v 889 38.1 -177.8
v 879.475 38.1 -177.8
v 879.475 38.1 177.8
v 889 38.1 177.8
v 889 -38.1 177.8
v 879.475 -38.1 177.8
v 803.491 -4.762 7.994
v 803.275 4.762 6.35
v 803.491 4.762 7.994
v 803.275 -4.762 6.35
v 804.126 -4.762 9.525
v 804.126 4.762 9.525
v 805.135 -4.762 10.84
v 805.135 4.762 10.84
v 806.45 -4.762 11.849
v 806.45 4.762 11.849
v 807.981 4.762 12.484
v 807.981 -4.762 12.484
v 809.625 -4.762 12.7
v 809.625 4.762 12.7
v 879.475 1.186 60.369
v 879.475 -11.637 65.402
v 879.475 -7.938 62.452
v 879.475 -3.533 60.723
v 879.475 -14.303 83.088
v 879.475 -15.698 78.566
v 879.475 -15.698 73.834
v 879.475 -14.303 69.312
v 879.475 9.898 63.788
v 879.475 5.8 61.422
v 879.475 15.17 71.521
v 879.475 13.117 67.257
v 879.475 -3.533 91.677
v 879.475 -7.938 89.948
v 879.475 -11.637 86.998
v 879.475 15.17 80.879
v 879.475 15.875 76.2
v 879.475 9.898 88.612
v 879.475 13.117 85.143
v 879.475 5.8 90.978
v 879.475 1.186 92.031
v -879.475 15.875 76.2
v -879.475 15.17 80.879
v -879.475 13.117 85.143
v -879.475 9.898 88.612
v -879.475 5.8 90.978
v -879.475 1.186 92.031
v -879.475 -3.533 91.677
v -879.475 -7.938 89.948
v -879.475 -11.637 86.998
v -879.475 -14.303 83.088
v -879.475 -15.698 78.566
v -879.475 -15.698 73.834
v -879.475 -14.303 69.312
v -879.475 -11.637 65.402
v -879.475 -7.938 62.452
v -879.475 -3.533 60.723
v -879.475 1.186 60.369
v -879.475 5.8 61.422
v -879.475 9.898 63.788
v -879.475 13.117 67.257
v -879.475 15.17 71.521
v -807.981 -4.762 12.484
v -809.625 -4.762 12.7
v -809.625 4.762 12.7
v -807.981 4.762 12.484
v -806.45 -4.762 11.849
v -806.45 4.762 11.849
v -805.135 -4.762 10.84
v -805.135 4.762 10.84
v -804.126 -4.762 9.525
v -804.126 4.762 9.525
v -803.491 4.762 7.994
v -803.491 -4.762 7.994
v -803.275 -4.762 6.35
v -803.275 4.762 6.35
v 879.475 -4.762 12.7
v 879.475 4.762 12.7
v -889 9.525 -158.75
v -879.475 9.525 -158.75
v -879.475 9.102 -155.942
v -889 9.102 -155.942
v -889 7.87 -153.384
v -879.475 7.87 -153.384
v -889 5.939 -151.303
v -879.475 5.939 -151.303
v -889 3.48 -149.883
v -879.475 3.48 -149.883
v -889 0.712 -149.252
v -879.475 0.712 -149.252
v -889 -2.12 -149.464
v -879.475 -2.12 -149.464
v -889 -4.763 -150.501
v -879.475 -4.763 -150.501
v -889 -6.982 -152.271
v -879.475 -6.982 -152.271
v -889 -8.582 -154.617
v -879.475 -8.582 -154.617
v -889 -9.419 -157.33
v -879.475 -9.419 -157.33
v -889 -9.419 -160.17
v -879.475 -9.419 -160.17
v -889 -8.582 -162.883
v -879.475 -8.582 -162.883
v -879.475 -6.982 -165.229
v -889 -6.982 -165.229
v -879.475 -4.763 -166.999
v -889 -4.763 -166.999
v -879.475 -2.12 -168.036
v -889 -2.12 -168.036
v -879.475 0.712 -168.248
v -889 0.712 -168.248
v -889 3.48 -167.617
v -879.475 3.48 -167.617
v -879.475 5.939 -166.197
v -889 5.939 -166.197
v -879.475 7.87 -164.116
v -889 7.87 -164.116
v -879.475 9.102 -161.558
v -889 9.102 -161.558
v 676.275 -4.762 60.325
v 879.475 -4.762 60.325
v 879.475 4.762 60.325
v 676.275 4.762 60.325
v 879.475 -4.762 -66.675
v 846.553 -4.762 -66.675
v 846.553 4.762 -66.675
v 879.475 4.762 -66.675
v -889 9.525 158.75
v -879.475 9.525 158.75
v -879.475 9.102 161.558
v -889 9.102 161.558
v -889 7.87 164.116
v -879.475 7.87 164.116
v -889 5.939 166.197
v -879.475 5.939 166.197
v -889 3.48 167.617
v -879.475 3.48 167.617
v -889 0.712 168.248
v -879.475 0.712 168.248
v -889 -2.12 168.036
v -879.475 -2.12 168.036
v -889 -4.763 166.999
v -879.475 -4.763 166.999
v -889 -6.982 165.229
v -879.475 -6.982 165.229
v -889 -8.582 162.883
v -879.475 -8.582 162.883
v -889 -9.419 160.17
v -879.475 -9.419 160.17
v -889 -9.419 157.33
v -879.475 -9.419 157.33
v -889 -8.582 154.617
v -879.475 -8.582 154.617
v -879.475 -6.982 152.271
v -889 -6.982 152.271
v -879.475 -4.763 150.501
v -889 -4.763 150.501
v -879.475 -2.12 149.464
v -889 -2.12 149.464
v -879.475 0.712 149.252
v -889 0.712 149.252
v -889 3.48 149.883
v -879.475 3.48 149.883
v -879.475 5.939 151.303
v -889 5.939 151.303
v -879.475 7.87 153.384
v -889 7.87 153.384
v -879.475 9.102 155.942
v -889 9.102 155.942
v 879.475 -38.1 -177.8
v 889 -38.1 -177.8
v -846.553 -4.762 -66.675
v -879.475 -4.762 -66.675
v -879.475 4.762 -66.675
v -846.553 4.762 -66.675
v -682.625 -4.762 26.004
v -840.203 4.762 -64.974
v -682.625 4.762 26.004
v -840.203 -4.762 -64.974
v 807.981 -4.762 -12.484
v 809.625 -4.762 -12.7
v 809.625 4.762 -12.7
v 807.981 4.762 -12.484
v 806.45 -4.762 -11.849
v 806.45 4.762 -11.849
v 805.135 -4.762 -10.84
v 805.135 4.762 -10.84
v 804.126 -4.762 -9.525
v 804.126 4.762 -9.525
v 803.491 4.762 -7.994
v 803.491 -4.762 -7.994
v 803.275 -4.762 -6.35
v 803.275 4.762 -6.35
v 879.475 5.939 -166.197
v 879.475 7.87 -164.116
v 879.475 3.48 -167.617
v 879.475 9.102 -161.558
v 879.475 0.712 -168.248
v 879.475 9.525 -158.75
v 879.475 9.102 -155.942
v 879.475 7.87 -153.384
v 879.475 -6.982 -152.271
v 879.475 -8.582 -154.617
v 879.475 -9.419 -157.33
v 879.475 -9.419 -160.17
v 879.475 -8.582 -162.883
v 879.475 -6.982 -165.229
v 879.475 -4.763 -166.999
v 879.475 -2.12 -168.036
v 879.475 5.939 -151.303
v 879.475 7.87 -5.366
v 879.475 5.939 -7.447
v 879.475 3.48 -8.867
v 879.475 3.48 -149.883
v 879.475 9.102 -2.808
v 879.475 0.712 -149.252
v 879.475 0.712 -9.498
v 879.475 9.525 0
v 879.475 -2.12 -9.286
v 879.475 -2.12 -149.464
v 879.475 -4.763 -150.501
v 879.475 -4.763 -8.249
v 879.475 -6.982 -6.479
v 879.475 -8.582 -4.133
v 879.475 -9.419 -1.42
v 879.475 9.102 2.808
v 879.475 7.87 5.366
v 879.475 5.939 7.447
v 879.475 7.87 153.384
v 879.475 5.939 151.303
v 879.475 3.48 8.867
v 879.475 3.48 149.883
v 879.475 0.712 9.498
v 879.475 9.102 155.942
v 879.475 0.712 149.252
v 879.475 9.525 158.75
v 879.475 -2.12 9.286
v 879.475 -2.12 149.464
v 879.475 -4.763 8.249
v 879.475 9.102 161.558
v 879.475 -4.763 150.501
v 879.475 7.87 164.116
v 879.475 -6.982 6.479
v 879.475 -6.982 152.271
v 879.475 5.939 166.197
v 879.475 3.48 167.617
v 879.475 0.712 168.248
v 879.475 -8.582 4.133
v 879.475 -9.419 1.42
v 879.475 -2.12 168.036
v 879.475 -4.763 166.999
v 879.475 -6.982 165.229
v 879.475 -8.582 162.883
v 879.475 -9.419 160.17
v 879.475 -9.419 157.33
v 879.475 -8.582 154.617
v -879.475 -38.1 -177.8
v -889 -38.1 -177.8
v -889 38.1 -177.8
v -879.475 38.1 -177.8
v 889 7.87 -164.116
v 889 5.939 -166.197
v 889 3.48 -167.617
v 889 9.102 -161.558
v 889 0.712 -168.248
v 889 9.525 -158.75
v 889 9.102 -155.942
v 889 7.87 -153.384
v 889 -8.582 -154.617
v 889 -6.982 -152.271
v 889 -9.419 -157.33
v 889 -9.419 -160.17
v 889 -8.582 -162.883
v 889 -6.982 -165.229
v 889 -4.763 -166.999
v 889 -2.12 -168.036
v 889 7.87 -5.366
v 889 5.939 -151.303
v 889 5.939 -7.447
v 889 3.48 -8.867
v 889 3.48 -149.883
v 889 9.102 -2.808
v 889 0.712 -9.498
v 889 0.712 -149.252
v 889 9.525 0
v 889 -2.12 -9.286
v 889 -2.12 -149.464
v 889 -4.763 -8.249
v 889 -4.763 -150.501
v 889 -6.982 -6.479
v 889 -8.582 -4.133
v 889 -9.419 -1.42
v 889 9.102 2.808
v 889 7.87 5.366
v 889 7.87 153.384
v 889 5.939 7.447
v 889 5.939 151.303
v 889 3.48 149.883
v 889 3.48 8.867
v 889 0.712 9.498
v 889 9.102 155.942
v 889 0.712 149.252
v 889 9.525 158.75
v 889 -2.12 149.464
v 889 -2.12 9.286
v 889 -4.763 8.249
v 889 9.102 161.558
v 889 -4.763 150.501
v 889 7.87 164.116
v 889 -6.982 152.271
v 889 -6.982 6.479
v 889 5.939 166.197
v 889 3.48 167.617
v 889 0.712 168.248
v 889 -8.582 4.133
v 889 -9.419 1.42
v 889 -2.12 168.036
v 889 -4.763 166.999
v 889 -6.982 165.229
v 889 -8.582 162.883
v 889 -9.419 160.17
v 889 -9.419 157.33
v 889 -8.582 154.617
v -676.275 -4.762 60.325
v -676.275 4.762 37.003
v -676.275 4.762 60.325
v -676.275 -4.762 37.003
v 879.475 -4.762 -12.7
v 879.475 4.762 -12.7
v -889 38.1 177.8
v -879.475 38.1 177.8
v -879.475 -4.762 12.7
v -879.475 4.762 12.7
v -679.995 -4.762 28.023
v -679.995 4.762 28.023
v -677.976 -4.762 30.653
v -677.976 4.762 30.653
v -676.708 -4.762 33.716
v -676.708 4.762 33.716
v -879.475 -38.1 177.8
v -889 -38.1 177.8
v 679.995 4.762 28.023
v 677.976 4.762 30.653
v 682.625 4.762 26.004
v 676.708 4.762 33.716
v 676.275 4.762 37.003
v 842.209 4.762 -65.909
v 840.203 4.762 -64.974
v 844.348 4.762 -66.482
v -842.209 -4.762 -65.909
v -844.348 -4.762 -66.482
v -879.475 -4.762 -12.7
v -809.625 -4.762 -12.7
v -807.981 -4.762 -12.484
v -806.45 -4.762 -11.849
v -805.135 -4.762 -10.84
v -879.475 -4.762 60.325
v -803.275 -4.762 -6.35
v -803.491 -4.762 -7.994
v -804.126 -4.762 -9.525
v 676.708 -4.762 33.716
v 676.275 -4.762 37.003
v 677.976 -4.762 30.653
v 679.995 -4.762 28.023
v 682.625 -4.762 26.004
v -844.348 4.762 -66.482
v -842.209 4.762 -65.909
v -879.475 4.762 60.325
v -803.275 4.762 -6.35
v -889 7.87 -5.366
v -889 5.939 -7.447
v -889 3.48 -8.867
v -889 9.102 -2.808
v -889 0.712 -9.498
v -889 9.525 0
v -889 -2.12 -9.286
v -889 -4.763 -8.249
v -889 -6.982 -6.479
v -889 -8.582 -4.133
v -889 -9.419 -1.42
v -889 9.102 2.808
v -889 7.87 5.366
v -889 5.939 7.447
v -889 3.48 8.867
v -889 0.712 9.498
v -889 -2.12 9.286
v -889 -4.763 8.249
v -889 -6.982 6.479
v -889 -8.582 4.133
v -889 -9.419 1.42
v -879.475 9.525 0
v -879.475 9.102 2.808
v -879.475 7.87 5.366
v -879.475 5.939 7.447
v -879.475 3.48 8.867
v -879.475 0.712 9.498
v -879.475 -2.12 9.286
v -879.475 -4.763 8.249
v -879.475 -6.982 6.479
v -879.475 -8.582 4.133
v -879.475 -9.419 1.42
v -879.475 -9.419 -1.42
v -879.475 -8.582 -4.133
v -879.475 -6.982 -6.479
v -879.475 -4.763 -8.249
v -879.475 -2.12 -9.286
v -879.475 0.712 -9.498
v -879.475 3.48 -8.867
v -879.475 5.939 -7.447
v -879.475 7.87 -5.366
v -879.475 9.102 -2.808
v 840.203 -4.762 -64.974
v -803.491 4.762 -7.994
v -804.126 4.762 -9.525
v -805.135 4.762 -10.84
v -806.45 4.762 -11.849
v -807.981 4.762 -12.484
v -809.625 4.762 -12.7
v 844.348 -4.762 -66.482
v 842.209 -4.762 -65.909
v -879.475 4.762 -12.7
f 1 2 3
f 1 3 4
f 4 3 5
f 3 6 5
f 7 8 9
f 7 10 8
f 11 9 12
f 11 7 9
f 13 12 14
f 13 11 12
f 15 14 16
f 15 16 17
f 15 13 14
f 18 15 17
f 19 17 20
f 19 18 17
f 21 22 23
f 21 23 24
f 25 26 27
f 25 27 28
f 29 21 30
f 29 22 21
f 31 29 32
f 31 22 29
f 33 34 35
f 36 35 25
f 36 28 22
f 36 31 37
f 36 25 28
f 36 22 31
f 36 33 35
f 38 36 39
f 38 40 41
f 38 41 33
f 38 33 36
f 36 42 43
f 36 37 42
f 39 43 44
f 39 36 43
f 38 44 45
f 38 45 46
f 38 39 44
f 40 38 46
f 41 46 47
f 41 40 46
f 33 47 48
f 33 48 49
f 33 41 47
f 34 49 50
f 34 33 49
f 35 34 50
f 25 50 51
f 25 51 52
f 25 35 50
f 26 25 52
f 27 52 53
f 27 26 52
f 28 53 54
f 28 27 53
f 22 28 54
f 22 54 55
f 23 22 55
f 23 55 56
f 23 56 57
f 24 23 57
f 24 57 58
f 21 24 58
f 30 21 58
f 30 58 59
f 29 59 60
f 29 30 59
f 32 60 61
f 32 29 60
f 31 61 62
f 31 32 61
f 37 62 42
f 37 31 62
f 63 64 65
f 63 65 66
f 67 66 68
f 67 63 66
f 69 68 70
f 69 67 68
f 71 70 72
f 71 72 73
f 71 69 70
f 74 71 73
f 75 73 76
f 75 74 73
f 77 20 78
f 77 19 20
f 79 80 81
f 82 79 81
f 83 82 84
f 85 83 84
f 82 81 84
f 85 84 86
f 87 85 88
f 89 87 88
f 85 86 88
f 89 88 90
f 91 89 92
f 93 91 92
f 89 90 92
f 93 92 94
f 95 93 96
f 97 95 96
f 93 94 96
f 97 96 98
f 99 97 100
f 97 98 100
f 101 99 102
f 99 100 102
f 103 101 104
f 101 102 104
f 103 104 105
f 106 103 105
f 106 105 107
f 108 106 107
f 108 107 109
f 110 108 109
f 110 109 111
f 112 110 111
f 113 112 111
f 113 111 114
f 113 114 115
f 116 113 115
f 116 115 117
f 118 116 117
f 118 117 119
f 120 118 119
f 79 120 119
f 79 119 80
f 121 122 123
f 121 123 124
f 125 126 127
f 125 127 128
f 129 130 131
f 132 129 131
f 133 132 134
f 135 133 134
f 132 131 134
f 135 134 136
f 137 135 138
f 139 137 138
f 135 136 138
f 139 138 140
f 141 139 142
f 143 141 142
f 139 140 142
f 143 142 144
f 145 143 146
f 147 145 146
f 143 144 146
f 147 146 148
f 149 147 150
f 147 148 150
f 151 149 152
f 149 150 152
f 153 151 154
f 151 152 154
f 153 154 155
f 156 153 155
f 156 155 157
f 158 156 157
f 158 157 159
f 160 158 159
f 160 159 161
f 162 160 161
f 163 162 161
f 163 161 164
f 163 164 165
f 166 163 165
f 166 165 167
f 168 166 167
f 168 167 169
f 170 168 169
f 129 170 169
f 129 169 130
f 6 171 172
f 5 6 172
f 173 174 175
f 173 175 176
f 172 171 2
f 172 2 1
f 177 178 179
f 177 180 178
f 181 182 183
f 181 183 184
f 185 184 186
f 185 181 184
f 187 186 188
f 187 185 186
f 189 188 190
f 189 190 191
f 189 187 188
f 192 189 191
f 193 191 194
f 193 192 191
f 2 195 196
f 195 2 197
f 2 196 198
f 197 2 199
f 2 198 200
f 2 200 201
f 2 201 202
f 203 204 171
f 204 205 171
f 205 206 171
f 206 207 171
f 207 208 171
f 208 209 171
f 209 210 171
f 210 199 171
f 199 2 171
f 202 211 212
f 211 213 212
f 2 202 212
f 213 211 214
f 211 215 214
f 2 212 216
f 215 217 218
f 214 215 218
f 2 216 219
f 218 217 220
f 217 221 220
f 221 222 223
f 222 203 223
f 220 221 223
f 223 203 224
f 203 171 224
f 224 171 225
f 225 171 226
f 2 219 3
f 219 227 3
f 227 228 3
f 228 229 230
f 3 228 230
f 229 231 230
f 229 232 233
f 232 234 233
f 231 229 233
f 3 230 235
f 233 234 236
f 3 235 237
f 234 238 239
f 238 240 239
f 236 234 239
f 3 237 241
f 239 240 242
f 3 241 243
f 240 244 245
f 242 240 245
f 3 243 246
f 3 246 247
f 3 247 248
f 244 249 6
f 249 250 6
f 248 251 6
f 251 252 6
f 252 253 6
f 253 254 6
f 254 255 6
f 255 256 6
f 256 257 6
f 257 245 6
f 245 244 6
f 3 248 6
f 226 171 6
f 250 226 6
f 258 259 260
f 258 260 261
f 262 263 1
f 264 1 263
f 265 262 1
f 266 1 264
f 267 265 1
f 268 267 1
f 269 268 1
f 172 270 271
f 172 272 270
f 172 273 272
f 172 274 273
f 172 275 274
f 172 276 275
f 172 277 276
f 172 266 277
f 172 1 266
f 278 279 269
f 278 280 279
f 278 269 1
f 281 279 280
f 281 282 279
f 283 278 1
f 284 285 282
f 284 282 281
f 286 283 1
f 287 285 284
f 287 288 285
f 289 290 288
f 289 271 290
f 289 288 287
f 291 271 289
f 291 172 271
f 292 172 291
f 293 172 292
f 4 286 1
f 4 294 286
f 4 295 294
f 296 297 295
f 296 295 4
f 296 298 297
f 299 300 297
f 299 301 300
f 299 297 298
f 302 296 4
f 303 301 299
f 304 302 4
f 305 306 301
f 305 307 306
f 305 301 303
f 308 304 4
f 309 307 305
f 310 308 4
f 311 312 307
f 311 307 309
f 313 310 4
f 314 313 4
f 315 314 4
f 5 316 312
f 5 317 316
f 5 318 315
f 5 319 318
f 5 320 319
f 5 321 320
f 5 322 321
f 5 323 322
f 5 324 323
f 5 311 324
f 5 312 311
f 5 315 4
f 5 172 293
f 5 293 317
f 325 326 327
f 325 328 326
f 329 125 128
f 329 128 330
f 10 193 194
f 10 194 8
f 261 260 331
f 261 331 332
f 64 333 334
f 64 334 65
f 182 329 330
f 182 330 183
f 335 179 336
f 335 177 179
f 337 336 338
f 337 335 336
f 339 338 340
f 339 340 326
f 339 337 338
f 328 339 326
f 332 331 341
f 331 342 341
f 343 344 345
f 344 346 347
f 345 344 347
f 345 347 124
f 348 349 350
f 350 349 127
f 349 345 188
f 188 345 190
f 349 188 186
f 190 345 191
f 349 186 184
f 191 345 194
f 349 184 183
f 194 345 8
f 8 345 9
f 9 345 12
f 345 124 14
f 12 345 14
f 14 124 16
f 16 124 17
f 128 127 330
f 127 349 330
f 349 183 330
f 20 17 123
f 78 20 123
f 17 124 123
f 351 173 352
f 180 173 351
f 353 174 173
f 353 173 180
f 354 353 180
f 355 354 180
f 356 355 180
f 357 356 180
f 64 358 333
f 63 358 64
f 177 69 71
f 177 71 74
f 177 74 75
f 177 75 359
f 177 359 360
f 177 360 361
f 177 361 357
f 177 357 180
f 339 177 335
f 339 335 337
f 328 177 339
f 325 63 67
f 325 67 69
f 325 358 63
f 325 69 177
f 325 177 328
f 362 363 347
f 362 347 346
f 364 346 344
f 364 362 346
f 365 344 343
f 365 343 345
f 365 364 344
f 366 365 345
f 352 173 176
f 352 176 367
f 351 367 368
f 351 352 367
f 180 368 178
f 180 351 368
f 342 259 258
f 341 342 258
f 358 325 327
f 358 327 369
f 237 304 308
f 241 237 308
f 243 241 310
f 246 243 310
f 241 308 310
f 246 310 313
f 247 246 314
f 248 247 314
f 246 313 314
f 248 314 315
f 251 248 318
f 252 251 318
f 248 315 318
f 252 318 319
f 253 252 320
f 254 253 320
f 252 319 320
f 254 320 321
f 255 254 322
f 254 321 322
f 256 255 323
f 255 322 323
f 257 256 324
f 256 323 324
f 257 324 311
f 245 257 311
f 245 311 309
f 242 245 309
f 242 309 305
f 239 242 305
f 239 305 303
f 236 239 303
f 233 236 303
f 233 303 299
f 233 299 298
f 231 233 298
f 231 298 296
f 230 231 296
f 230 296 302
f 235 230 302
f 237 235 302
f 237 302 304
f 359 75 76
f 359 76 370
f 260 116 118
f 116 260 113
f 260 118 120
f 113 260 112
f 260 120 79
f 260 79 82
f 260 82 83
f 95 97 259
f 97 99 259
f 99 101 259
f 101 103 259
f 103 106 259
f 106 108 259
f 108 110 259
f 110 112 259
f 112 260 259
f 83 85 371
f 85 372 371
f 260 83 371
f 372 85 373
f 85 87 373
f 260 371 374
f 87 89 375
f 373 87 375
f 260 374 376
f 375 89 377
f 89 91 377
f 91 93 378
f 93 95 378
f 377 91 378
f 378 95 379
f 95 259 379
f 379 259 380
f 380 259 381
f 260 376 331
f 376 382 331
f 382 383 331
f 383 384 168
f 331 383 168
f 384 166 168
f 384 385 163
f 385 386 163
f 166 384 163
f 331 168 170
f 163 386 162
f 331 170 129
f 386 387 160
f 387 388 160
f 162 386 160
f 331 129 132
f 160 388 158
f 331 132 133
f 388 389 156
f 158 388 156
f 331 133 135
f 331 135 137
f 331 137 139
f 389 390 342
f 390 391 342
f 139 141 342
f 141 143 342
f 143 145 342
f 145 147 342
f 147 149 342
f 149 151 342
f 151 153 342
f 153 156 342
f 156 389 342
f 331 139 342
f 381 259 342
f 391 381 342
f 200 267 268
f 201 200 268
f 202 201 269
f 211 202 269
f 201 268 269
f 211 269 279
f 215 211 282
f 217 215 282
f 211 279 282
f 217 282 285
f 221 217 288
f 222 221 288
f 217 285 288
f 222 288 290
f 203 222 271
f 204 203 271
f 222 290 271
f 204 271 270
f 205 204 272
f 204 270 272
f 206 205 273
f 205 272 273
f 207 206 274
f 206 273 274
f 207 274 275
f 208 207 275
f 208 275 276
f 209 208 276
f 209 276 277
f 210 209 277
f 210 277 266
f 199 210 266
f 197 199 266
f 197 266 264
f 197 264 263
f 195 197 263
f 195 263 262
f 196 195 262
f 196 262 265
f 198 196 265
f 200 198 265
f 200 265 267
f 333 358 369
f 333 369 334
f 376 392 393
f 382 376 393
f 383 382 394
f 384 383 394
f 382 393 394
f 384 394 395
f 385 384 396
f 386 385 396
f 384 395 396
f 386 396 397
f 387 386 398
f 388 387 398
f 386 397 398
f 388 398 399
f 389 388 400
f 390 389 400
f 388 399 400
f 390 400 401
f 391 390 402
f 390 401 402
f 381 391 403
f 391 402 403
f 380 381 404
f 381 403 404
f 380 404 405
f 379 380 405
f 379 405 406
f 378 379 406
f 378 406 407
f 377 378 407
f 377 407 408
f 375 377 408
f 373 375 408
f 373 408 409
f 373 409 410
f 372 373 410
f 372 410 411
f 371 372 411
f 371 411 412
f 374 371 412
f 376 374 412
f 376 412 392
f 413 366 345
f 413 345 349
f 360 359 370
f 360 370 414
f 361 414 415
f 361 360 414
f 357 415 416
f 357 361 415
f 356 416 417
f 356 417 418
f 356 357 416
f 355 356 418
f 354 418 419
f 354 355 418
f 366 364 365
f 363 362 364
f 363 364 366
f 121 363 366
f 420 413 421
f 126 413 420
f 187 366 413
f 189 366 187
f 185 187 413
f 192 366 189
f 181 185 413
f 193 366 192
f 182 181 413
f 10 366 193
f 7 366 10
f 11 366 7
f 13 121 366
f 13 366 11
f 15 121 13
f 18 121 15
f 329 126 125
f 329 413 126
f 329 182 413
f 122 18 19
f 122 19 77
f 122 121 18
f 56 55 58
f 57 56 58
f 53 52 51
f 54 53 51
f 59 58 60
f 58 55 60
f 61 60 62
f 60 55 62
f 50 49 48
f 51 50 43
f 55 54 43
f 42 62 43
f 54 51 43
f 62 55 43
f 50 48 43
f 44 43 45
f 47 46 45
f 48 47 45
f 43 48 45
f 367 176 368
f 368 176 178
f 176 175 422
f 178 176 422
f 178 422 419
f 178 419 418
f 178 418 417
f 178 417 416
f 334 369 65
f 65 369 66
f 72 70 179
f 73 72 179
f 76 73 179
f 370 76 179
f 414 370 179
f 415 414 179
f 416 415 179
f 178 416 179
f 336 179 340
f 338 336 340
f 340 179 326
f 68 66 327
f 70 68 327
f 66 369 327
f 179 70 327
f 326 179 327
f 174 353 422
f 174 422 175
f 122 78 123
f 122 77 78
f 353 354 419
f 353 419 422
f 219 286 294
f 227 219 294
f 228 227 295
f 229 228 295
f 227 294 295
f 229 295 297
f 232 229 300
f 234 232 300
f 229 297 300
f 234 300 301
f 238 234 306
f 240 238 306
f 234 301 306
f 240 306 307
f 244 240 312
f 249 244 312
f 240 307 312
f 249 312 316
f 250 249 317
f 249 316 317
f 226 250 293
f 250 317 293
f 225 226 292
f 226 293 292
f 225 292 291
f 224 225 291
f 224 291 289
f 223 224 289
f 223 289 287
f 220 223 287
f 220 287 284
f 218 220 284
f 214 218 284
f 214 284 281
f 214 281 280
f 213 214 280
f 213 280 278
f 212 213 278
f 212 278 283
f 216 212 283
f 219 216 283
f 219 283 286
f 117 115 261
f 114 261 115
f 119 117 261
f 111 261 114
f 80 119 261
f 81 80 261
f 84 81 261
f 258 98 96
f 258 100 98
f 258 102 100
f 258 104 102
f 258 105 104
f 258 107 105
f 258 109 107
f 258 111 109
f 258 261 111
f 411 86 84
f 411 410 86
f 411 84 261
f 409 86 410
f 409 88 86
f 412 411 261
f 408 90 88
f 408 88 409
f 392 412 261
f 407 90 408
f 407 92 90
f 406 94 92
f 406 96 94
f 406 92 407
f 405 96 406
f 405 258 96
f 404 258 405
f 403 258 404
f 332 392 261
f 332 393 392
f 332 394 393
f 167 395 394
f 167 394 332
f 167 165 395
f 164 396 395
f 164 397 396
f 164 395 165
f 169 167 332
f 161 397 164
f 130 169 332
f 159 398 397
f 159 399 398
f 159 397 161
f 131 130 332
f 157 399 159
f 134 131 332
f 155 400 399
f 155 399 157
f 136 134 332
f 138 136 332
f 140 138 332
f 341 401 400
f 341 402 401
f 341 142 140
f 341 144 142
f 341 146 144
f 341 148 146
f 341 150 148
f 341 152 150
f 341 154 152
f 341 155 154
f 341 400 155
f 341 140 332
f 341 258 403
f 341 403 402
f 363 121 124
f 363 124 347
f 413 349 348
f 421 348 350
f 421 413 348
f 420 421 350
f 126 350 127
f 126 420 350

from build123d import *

# Parameters (mm, degrees)
F0_W          = 9.525
F0_H          = 355.6
F1_DEPTH      = 38.1
F1_DEPTH_BACK = 38.1
F2_R          = 15.875
F3_DEPTH      = 879.475
F3_DEPTH_BACK = 879.475
F4_R          = 9.525
F5_DEPTH      = 1778.001
F7_DEPTH      = 4.7625
F7_DEPTH_BACK = 4.7625


# Not quite as in the source:
# - a length typed as a fraction of an inch, garbled in the dataset ("3 / 203.2 mm" for 3/8 in), is restored


with BuildPart() as f1:
    # F0 (on Front) → F1 (new body, two sides)
    with BuildSketch(Plane.XZ) as f1_sk:
        with Locations((-884.2375, 0)):
            Rectangle(F0_W, F0_H)
    extrude(amount=F1_DEPTH)
    extrude(f1_sk.sketch, amount=-F1_DEPTH_BACK)


with BuildPart() as f1b:
    # F0 (on Front) → F1, piece 2 (new body, two sides)
    with BuildSketch(Plane.XZ) as f1_2_sk:
        with Locations((884.2375, 0)):
            Rectangle(F0_W, F0_H)
    extrude(amount=F1_DEPTH)
    extrude(f1_2_sk.sketch, amount=-F1_DEPTH_BACK)


with BuildPart() as f3:
    # F2 (on Right) → F3 (new body, two sides)
    with BuildSketch(Plane.YZ) as f3_sk:
        with Locations((0, 76.2)):
            Circle(F2_R)
    extrude(amount=F3_DEPTH)
    extrude(f3_sk.sketch, amount=-F3_DEPTH_BACK)


with BuildPart() as f5_tool:
    # F4 (on face) → F5 (new body, through all)
    with BuildSketch(Plane.YZ.offset(889)):
        with Locations((0, -158.75)):
            Circle(F4_R)
        Circle(F4_R)
        with Locations((0, 158.75)):
            Circle(F4_R)
    extrude(amount=-F5_DEPTH)


with BuildPart() as f1_1:
    add(f1.part)

    # F5: cut by f5_tool
    add(f5_tool.part, mode=Mode.SUBTRACT)


with BuildPart() as f1b_1:
    add(f1b.part)

    # F5: cut by f5_tool
    add(f5_tool.part, mode=Mode.SUBTRACT)


with BuildPart() as f7:
    # F6 (on Front) → F7 (new body, two sides)
    with BuildSketch(Plane.XZ) as f7_sk:
        with BuildLine():
            Line((879.475, 12.7), (879.475, 60.325))
            Line((879.4750000002, 60.325), (676.275, 60.325))
            Line((676.275, 60.325), (676.275, 37.0027863833))
            ThreePointArc((676.275, 37.0027863833), (677.9764773719, 30.6527863833), (682.625, 26.0042637552))
            Line((682.625, 26.0042637552), (840.203148376, -64.9735226281))
            ThreePointArc((840.203148376, -64.9735226281), (843.2661465032, -66.2422579939), (846.553148376, -66.675))
            Line((846.553148376, -66.675), (879.475, -66.675))
            Line((879.475, -66.675), (879.475, -12.7))
            Line((879.475, -12.7), (809.625, -12.7))
            ThreePointArc((809.625, -12.7), (805.1348719395, -10.8401280605), (803.275, -6.35))
            Line((803.275, -6.35), (803.275, 6.35))
            ThreePointArc((803.275, 6.35), (805.1348719395, 10.8401280605), (809.625, 12.7))
            Line((809.625, 12.7), (879.475, 12.7))
        make_face()
    extrude(amount=F7_DEPTH)
    extrude(f7_sk.sketch, amount=-F7_DEPTH_BACK)


with BuildPart() as f7b:
    # F6 (on Front) → F7, piece 2 (new body, two sides)
    with BuildSketch(Plane.XZ) as f7_2_sk:
        with BuildLine():
            Line((-676.275, 37.0027863833), (-676.275, 60.325))
            Line((-676.275, 60.325), (-879.4749999994, 60.325))
            Line((-879.475, 60.325), (-879.475, 12.7))
            Line((-879.475, 12.7), (-809.625, 12.7))
            ThreePointArc((-809.625, 12.7), (-805.1348719395, 10.8401280605), (-803.275, 6.35))
            Line((-803.275, 6.35), (-803.275, -6.35))
            ThreePointArc((-803.275, -6.35), (-805.1348719395, -10.8401280605), (-809.625, -12.7))
            Line((-809.625, -12.7), (-879.475, -12.7))
            Line((-879.475, -12.7), (-879.475, -66.675))
            Line((-879.475, -66.675), (-846.553148376, -66.675))
            ThreePointArc((-846.553148376, -66.675), (-843.2661465032, -66.2422579939), (-840.203148376, -64.9735226281))
            Line((-840.203148376, -64.9735226281), (-682.625, 26.0042637552))
            ThreePointArc((-682.625, 26.0042637552), (-677.9764773719, 30.6527863833), (-676.275, 37.0027863833))
        make_face()
    extrude(amount=F7_DEPTH)
    extrude(f7_2_sk.sketch, amount=-F7_DEPTH_BACK)


solid = Compound([f3.part, f1_1.part, f1b_1.part, f7.part, f7b.part])
